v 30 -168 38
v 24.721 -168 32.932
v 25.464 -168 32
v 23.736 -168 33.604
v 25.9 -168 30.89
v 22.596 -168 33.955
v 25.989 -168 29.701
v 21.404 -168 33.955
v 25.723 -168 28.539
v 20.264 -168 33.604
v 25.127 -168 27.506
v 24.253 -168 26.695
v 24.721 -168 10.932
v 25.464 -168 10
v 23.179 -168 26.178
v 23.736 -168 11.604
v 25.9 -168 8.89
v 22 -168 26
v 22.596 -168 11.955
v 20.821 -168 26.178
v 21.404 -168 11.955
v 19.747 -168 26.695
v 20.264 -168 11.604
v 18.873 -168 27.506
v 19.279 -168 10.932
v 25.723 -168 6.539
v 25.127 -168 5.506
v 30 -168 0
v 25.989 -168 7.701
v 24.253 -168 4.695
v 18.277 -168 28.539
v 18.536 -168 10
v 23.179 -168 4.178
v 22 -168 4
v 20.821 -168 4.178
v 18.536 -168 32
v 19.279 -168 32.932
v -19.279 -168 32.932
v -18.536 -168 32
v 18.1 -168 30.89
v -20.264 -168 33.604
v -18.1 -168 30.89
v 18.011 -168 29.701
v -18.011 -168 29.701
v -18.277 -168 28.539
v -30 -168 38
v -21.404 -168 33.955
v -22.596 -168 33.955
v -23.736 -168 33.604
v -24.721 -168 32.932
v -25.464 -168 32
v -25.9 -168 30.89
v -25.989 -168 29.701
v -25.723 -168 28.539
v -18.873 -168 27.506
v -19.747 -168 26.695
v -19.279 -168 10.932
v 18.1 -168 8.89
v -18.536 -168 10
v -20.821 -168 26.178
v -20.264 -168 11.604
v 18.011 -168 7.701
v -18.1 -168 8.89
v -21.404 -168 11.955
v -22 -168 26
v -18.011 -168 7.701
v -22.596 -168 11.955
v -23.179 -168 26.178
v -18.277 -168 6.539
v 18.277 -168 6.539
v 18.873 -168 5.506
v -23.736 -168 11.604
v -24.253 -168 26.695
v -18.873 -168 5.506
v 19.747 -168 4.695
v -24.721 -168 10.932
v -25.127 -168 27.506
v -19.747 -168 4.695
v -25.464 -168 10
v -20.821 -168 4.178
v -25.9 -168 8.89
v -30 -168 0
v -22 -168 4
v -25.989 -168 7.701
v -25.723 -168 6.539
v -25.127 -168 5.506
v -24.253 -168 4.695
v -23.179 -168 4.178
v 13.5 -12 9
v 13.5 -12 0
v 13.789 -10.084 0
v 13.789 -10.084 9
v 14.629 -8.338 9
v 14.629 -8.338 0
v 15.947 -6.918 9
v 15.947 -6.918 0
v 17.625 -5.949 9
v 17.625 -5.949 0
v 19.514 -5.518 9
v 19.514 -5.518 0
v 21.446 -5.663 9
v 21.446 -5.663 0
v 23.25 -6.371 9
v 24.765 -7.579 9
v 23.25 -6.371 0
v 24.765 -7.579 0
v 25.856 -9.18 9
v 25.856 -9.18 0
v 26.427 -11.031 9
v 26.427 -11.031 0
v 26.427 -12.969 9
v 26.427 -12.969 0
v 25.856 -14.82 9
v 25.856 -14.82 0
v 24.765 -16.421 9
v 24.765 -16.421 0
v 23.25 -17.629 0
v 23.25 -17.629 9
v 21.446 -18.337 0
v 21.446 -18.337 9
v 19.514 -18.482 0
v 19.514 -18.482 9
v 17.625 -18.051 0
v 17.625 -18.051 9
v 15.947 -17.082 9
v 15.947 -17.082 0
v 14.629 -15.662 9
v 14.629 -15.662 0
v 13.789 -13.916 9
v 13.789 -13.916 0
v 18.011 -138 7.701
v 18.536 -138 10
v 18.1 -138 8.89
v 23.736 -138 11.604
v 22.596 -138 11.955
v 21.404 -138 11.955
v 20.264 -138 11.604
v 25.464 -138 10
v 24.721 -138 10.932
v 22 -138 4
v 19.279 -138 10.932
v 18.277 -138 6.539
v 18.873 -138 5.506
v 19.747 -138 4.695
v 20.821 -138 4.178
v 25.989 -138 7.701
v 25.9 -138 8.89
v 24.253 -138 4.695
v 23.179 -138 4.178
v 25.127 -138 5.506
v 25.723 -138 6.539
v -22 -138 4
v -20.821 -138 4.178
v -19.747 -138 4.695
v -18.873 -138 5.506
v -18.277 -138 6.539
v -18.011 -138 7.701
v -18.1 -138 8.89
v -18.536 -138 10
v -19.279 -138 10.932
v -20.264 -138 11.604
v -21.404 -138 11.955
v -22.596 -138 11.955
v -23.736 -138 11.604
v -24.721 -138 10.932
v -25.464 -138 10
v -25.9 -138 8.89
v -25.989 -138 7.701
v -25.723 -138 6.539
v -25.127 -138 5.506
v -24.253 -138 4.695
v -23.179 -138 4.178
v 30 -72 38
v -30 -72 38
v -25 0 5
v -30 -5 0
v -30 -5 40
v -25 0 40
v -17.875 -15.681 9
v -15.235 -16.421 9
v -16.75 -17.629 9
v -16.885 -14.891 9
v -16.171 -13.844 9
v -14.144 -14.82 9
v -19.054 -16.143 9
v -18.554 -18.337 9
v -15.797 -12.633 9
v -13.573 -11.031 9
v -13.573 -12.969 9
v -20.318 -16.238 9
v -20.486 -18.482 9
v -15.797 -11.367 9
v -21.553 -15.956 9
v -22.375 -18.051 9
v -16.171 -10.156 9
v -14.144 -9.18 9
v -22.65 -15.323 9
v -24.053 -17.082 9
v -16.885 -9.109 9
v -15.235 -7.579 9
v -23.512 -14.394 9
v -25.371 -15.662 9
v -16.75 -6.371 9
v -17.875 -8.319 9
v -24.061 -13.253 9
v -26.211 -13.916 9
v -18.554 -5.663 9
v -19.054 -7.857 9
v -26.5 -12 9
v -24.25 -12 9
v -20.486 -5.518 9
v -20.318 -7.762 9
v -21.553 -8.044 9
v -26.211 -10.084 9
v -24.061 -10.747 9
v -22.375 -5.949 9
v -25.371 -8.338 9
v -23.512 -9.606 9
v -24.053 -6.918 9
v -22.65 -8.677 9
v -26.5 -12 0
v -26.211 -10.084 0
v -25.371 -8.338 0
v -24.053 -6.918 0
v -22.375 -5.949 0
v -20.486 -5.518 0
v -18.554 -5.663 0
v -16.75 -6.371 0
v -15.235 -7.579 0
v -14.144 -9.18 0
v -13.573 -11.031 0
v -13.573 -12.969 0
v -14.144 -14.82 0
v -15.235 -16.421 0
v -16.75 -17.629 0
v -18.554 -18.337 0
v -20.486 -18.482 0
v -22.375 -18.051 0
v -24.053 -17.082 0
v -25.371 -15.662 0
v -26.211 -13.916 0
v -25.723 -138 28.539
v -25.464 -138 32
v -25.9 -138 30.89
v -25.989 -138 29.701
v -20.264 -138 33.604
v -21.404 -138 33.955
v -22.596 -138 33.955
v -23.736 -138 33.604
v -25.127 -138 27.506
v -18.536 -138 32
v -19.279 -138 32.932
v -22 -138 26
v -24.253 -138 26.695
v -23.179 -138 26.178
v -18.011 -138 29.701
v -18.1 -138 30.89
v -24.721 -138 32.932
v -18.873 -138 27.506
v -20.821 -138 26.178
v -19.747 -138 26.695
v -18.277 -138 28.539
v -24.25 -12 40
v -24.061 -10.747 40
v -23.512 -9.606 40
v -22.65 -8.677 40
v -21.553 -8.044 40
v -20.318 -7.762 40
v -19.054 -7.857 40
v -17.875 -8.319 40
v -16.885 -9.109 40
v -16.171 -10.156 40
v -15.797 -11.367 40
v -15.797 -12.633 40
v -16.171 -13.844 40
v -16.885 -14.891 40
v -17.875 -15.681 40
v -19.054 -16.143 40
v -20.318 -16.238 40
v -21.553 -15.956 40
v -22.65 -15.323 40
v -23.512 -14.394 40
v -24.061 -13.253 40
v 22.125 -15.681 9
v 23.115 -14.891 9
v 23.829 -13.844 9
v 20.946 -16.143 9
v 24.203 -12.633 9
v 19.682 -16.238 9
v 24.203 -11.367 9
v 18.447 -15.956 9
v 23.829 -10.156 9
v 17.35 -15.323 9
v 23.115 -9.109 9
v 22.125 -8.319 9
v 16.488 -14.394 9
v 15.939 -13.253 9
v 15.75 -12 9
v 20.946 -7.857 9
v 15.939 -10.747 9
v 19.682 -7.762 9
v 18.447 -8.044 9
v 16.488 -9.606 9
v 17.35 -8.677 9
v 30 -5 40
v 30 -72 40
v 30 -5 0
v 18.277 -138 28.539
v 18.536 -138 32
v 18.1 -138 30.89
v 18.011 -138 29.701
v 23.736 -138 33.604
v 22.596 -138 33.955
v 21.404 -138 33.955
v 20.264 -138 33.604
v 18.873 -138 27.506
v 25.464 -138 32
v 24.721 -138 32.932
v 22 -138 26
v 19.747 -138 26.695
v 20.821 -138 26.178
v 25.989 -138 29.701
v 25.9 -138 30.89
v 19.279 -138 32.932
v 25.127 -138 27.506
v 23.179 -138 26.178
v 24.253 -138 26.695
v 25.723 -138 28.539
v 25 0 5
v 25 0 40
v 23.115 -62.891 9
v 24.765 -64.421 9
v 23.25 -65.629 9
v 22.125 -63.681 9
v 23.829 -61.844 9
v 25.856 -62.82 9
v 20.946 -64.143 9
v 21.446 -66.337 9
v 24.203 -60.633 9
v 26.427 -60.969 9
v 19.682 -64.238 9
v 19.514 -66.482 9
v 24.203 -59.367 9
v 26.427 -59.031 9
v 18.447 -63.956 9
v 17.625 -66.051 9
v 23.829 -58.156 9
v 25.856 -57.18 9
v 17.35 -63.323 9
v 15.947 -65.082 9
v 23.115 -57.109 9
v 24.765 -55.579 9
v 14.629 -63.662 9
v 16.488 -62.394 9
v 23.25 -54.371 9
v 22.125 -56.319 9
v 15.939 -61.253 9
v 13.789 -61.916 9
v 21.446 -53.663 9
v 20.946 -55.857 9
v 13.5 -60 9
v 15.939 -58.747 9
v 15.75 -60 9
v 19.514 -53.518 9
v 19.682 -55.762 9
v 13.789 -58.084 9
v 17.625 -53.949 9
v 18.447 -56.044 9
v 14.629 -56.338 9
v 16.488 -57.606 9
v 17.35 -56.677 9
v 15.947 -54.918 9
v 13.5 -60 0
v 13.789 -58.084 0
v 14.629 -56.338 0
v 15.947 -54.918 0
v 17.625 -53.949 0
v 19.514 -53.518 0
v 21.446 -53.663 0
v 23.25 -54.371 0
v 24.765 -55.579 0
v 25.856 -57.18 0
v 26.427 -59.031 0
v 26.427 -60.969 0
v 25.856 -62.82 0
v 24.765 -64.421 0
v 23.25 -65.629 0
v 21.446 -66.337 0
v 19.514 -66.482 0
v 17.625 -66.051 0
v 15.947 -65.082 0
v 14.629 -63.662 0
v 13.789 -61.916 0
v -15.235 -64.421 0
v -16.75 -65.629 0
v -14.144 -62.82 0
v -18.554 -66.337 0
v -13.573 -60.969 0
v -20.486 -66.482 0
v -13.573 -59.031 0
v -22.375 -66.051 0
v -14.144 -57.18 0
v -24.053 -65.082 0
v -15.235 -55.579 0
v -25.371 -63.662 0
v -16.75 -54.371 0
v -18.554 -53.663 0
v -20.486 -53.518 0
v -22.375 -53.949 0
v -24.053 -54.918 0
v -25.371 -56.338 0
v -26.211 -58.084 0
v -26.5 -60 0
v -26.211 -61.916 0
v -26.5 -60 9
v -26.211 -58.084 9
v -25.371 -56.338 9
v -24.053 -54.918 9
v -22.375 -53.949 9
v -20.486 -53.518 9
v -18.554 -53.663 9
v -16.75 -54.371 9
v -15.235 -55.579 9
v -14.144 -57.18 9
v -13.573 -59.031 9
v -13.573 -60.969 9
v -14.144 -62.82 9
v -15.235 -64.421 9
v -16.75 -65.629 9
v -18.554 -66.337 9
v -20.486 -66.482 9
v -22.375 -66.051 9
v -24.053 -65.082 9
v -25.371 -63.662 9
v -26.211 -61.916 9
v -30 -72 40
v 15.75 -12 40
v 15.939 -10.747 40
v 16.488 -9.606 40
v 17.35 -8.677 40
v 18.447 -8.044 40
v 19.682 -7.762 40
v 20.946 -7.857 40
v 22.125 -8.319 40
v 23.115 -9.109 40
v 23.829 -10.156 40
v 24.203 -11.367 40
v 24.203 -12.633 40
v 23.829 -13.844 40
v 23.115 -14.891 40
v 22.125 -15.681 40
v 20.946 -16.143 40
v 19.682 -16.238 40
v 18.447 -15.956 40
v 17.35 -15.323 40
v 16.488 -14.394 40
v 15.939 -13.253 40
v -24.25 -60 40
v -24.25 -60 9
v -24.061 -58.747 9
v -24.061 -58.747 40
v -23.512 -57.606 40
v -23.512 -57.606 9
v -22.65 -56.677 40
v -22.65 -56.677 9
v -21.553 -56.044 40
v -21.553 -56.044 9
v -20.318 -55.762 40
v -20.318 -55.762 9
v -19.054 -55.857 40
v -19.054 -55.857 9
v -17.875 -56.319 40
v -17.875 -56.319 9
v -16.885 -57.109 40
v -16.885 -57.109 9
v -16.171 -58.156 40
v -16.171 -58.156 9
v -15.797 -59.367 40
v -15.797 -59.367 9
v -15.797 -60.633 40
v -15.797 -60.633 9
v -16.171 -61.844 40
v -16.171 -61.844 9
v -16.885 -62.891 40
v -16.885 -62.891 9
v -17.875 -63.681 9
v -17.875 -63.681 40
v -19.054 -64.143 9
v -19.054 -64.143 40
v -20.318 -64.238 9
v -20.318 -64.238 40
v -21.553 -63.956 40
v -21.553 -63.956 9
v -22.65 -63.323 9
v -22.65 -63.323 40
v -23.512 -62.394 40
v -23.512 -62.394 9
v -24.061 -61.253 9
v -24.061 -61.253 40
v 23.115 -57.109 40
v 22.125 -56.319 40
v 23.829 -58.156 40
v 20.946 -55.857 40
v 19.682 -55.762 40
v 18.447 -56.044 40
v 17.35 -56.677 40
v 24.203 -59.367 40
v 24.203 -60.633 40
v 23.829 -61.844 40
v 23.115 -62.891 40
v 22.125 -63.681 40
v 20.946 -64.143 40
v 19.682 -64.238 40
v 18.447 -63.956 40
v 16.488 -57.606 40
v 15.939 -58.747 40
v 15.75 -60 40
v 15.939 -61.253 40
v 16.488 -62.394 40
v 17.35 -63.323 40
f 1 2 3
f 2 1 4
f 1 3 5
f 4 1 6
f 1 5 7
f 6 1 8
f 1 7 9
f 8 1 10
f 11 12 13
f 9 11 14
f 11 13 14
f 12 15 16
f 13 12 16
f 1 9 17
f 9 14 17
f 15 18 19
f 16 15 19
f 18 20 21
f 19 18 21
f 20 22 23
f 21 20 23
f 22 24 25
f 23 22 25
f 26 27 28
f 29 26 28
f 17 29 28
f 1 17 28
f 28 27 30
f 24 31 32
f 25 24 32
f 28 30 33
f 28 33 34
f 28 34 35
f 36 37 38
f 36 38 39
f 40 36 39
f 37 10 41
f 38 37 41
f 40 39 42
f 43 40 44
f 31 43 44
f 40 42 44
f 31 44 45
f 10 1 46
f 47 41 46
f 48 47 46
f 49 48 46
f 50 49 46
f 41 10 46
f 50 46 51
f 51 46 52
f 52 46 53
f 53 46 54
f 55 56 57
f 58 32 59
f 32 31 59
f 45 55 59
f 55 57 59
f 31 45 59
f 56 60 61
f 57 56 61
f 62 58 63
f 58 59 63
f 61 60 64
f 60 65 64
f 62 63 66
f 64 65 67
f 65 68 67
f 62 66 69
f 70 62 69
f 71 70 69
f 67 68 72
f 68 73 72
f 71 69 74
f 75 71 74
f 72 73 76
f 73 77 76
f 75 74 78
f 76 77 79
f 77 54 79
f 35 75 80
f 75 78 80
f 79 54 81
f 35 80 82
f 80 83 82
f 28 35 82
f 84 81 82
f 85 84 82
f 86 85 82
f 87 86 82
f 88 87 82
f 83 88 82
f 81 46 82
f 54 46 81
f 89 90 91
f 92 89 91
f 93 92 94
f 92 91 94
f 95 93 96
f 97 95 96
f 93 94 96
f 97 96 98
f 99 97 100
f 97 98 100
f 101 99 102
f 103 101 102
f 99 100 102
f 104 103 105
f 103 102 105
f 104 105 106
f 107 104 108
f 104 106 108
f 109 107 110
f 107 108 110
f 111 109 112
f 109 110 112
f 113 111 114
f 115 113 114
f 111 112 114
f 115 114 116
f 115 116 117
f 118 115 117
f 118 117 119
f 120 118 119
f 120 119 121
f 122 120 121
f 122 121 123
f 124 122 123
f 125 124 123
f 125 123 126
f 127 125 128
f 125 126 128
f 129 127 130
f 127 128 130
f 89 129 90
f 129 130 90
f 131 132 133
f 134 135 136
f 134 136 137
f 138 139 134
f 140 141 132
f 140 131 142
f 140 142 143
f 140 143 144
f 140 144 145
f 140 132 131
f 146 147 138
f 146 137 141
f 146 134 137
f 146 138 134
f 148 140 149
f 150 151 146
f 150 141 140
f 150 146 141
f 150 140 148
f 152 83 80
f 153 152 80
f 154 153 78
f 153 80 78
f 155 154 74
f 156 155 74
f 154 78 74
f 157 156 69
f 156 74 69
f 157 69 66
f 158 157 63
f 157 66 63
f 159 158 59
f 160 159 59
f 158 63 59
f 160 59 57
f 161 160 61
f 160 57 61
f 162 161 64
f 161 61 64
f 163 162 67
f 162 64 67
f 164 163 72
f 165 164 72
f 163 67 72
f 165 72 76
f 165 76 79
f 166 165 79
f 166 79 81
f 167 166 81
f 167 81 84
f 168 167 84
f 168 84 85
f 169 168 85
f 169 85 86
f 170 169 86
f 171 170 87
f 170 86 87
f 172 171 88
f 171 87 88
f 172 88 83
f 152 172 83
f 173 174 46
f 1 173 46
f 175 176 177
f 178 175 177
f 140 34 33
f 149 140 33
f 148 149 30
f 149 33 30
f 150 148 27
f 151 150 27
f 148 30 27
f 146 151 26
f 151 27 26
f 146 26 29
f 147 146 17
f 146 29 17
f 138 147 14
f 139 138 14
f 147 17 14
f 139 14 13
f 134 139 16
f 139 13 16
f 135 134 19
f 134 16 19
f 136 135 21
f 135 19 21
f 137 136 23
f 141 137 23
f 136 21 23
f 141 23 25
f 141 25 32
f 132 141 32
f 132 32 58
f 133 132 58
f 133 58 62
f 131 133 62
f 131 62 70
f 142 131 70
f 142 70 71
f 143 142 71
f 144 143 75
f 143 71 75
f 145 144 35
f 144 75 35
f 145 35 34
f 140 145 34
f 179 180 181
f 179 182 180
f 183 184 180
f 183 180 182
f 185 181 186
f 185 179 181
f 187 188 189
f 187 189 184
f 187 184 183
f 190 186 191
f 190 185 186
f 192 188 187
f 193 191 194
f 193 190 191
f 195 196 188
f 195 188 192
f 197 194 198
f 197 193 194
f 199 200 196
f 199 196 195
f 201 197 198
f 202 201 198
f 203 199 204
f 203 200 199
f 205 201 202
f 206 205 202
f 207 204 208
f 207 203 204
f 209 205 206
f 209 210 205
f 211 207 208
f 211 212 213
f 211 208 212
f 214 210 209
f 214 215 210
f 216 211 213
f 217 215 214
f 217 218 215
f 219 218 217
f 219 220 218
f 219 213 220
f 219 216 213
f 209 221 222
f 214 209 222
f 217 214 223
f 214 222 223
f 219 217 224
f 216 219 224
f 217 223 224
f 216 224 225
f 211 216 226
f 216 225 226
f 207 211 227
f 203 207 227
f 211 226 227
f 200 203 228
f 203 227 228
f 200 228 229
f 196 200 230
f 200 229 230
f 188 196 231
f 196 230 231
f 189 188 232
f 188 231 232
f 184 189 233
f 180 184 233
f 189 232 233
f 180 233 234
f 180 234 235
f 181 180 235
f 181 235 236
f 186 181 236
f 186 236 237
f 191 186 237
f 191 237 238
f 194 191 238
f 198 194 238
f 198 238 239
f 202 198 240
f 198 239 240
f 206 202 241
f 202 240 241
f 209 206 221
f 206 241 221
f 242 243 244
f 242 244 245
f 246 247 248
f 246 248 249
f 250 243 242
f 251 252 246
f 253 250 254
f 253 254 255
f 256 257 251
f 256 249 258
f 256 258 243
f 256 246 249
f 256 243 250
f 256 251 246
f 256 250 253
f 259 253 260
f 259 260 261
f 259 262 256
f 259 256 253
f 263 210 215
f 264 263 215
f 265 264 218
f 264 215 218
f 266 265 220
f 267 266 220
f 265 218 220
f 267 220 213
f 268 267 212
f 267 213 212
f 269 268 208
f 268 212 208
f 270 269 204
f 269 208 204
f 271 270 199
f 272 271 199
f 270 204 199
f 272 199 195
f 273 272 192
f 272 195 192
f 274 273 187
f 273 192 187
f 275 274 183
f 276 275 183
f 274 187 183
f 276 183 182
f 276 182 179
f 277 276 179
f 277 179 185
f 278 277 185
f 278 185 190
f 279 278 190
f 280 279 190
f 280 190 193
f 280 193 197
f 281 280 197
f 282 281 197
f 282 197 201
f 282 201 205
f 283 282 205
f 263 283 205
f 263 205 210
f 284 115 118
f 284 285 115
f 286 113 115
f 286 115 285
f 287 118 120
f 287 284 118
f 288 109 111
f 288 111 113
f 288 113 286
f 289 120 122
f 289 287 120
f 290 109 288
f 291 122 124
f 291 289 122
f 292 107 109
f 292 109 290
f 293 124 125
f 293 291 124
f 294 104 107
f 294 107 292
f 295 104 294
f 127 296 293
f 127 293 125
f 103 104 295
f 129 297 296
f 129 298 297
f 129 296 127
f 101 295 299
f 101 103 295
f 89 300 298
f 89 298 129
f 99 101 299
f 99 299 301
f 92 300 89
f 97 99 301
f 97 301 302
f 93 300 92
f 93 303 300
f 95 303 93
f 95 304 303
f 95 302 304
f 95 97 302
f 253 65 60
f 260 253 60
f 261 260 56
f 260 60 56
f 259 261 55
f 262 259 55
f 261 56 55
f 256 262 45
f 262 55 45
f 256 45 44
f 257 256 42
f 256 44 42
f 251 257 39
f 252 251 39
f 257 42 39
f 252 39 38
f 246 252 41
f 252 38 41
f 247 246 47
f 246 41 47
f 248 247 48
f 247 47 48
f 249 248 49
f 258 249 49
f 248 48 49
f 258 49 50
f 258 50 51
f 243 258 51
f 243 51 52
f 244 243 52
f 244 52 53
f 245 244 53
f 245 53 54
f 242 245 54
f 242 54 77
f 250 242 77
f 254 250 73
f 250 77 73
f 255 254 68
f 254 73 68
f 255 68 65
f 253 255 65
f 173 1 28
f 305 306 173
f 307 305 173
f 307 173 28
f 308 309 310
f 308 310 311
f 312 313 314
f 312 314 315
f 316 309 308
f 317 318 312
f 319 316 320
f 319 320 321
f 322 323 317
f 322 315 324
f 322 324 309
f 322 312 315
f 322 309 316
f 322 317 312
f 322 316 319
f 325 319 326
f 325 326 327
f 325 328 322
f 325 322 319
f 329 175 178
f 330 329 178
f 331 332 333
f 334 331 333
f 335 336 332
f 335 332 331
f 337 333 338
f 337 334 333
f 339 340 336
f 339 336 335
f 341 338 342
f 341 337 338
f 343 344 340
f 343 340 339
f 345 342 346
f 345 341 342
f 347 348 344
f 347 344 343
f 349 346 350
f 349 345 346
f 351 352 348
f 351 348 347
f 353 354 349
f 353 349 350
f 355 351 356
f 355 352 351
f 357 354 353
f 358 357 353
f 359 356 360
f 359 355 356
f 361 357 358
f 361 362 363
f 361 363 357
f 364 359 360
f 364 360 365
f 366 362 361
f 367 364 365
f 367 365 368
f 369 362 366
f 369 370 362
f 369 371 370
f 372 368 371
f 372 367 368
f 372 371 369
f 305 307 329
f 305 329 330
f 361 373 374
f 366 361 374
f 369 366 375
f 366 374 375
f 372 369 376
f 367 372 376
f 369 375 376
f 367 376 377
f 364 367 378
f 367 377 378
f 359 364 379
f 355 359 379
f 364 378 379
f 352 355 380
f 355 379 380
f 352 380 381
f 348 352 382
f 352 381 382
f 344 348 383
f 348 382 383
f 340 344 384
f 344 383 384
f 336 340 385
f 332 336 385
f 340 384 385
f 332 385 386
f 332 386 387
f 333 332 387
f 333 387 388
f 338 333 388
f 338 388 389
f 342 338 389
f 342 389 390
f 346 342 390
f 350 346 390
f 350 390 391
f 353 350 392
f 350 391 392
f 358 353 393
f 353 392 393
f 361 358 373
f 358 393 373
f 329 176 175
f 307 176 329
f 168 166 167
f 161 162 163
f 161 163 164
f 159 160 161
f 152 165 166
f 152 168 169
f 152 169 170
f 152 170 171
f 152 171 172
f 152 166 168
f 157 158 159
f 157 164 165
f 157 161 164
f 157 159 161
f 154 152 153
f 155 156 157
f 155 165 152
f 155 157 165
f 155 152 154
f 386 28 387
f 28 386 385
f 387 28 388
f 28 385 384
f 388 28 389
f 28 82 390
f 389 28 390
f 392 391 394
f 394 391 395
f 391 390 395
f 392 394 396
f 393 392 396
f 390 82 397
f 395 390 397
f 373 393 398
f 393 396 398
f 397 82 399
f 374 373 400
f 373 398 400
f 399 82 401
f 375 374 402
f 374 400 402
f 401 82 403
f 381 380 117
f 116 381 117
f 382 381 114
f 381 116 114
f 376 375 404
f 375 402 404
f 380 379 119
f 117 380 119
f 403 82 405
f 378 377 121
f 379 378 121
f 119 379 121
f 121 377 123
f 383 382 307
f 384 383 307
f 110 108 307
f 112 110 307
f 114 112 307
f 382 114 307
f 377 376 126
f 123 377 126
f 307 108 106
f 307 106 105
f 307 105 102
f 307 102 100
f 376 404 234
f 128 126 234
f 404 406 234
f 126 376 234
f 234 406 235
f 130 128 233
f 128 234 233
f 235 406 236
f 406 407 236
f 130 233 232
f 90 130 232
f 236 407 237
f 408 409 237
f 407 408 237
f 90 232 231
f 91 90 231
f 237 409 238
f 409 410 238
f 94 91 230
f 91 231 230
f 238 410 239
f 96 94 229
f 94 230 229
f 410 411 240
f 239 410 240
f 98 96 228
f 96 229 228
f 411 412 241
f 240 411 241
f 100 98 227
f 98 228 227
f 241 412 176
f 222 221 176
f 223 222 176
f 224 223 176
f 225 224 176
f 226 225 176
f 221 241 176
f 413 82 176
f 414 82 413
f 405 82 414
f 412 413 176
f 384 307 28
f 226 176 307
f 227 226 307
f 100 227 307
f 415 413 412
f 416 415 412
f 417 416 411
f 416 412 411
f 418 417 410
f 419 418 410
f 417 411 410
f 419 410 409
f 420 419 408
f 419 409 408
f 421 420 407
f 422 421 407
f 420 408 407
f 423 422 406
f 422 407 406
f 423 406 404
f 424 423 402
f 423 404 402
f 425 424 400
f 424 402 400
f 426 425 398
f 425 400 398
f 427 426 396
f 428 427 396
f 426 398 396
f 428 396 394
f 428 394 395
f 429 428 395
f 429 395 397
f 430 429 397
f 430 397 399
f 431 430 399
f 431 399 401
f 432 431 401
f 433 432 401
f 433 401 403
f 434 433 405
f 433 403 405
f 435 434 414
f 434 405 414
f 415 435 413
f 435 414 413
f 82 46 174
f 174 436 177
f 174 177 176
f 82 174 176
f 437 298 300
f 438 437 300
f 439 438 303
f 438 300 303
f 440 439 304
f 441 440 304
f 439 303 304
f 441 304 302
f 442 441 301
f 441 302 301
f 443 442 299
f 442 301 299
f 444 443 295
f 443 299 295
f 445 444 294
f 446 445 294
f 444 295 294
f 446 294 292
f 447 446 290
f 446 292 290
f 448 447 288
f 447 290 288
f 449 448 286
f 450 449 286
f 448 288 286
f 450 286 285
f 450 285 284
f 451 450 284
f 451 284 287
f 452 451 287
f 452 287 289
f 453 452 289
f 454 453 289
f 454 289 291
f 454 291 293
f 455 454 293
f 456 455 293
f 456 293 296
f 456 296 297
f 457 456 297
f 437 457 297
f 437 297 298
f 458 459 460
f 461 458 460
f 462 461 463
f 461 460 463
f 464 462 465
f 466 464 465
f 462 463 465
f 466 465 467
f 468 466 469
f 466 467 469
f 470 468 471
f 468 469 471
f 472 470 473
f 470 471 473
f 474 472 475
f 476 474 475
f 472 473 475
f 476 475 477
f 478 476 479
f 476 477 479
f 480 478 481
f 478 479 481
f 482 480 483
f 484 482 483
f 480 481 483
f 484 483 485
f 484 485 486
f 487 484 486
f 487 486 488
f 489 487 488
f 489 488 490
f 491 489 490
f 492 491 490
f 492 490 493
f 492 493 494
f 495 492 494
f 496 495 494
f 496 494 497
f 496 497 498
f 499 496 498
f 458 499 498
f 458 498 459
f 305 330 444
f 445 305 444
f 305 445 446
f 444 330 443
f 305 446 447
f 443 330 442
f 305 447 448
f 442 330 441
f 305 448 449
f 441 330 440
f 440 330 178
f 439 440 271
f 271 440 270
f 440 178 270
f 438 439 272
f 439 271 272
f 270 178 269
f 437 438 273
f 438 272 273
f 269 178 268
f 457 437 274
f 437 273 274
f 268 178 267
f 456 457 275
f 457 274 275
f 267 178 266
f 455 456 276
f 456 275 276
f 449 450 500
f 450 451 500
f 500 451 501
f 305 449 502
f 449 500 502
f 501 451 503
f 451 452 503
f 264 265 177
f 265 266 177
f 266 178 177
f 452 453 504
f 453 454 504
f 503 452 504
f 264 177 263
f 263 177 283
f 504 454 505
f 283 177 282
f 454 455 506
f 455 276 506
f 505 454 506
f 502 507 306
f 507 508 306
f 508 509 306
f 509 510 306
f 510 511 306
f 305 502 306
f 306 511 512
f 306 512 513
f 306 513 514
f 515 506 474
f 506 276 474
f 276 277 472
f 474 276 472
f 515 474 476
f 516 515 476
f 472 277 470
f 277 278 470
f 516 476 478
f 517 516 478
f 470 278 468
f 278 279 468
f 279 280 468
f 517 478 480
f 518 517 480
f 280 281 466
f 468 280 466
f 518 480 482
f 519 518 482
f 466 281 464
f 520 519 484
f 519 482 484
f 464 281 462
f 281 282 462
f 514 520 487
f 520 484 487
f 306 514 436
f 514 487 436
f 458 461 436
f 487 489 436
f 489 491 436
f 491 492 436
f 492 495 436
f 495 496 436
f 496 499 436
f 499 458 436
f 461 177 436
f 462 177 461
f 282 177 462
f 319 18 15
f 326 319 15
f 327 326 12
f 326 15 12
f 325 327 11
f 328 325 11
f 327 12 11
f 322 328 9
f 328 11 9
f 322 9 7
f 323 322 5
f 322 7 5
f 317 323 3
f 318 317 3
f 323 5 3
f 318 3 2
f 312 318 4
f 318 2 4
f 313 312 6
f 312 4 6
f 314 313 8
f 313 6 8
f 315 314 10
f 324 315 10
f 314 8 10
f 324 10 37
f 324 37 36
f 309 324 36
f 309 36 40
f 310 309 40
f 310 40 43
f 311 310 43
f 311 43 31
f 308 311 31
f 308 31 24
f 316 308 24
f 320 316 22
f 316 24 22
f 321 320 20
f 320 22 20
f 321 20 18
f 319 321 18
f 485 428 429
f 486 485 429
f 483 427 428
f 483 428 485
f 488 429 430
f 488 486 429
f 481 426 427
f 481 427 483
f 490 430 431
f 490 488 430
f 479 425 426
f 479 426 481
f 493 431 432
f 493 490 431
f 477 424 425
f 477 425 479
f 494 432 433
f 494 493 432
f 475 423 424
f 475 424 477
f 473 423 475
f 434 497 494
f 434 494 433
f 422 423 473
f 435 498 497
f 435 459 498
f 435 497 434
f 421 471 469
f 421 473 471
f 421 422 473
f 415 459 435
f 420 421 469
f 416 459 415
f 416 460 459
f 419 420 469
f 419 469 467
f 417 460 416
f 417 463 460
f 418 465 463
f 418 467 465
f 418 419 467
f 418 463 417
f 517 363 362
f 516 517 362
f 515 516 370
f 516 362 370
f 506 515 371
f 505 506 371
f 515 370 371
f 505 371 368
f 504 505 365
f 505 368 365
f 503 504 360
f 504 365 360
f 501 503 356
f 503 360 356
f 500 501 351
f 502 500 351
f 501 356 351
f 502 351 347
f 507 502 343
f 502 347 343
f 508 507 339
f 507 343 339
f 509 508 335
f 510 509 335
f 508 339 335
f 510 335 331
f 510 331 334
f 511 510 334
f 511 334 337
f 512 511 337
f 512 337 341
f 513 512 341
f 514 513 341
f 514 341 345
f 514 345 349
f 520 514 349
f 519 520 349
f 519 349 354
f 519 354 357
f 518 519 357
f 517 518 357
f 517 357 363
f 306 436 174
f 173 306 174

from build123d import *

# Parameters (mm, degrees)
SALIENTE_EXTRUIR1_DEPTH      = 30
SALIENTE_EXTRUIR1_DEPTH_BACK = 30
CHAFL_N1_SIZE                = 5
CHAFL_N2_SIZE                = 5
CROQUIS2_R                   = 6.5
CORTAR_EXTRUIR1_DEPTH        = 9
CORTAR_EXTRUIR2_REACH        = 175.45
CROQUIS3_R                   = 4.25
CROQUIS4_R                   = 4
CORTAR_EXTRUIR3_DEPTH        = 30


with BuildPart() as part:
    # Croquis1 → Saliente-Extruir1 (new, two sides: drawn at the far end of the back side and taken through both)
    with BuildSketch(Plane(origin=(0, 0, 0), x_dir=(0, 0, -1), z_dir=(1, 0, 0)).offset(-SALIENTE_EXTRUIR1_DEPTH_BACK)):
        Polygon((0, 0), (-40, 0), (-40, -72), (-38, -72), (-38, -168), (0, -168), align=None)
    extrude(amount=SALIENTE_EXTRUIR1_DEPTH + SALIENTE_EXTRUIR1_DEPTH_BACK)

    # Chaflán1
    chafl_n1_edges = [part.edges().sort_by_distance(p)[0] for p in [
        (0, 0, 0),
    ]]
    chamfer(chafl_n1_edges, length=CHAFL_N1_SIZE)

    # Chaflán2
    chafl_n2_edges = [part.edges().sort_by_distance(p)[0] for p in [
        (30, 0, 22.5),
        (-30, 0, 22.5),
    ]]
    chamfer(chafl_n2_edges, length=CHAFL_N2_SIZE)

    # Croquis2 → Cortar-Extruir1 (cut)
    with BuildSketch(Plane(origin=(0, 0, 0), x_dir=(-1, 0, 0), z_dir=(0, 0, -1))):
        with Locations((-20, -12)):
            Circle(CROQUIS2_R)
        with Locations((20, -12)):
            Circle(CROQUIS2_R)
        with Locations((-20, -60)):
            Circle(CROQUIS2_R)
        with Locations((20, -60)):
            Circle(CROQUIS2_R)
    extrude(amount=-CORTAR_EXTRUIR1_DEPTH, mode=Mode.SUBTRACT)

    # Croquis3 → Cortar-Extruir2 (cut, up to next)
    with BuildSketch(Plane(origin=(0, 0, 9), x_dir=(-1, 0, 0), z_dir=(0, 0, -1)), mode=Mode.PRIVATE) as cortar_extruir2_sk1:
        with Locations((-20, -12)):
            Circle(CROQUIS3_R)
    cortar_extruir2_tool1 = extrude(cortar_extruir2_sk1.sketch, amount=-CORTAR_EXTRUIR2_REACH, mode=Mode.PRIVATE) & part.part
    # Croquis3 → Cortar-Extruir2 (cut, up to next)
    with BuildSketch(Plane(origin=(0, 0, 9), x_dir=(-1, 0, 0), z_dir=(0, 0, -1)), mode=Mode.PRIVATE) as cortar_extruir2_sk2:
        with Locations((20, -12)):
            Circle(CROQUIS3_R)
    cortar_extruir2_tool2 = extrude(cortar_extruir2_sk2.sketch, amount=-CORTAR_EXTRUIR2_REACH, mode=Mode.PRIVATE) & part.part
    # Croquis3 → Cortar-Extruir2 (cut, up to next)
    with BuildSketch(Plane(origin=(0, 0, 9), x_dir=(-1, 0, 0), z_dir=(0, 0, -1)), mode=Mode.PRIVATE) as cortar_extruir2_sk3:
        with Locations((20, -60)):
            Circle(CROQUIS3_R)
    cortar_extruir2_tool3 = extrude(cortar_extruir2_sk3.sketch, amount=-CORTAR_EXTRUIR2_REACH, mode=Mode.PRIVATE) & part.part
    # Croquis3 → Cortar-Extruir2 (cut, up to next)
    with BuildSketch(Plane(origin=(0, 0, 9), x_dir=(-1, 0, 0), z_dir=(0, 0, -1)), mode=Mode.PRIVATE) as cortar_extruir2_sk4:
        with Locations((-20, -60)):
            Circle(CROQUIS3_R)
    cortar_extruir2_tool4 = extrude(cortar_extruir2_sk4.sketch, amount=-CORTAR_EXTRUIR2_REACH, mode=Mode.PRIVATE) & part.part
    add(cortar_extruir2_tool1.solids().sort_by_distance((20, -12, 9))[0], mode=Mode.SUBTRACT)
    add(cortar_extruir2_tool2.solids().sort_by_distance((-20, -12, 9))[0], mode=Mode.SUBTRACT)
    add(cortar_extruir2_tool3.solids().sort_by_distance((-20, -60, 9))[0], mode=Mode.SUBTRACT)
    add(cortar_extruir2_tool4.solids().sort_by_distance((20, -60, 9))[0], mode=Mode.SUBTRACT)

    # Croquis4 → Cortar-Extruir3 (cut)
    with BuildSketch(Plane.XZ.offset(168)):
        with Locations((-22, 30)):
            Circle(CROQUIS4_R)
        with Locations((-22, 8)):
            Circle(CROQUIS4_R)
        with Locations((22, 30)):
            Circle(CROQUIS4_R)
        with Locations((22, 8)):
            Circle(CROQUIS4_R)
    extrude(amount=-CORTAR_EXTRUIR3_DEPTH, mode=Mode.SUBTRACT)


solid = part.part
